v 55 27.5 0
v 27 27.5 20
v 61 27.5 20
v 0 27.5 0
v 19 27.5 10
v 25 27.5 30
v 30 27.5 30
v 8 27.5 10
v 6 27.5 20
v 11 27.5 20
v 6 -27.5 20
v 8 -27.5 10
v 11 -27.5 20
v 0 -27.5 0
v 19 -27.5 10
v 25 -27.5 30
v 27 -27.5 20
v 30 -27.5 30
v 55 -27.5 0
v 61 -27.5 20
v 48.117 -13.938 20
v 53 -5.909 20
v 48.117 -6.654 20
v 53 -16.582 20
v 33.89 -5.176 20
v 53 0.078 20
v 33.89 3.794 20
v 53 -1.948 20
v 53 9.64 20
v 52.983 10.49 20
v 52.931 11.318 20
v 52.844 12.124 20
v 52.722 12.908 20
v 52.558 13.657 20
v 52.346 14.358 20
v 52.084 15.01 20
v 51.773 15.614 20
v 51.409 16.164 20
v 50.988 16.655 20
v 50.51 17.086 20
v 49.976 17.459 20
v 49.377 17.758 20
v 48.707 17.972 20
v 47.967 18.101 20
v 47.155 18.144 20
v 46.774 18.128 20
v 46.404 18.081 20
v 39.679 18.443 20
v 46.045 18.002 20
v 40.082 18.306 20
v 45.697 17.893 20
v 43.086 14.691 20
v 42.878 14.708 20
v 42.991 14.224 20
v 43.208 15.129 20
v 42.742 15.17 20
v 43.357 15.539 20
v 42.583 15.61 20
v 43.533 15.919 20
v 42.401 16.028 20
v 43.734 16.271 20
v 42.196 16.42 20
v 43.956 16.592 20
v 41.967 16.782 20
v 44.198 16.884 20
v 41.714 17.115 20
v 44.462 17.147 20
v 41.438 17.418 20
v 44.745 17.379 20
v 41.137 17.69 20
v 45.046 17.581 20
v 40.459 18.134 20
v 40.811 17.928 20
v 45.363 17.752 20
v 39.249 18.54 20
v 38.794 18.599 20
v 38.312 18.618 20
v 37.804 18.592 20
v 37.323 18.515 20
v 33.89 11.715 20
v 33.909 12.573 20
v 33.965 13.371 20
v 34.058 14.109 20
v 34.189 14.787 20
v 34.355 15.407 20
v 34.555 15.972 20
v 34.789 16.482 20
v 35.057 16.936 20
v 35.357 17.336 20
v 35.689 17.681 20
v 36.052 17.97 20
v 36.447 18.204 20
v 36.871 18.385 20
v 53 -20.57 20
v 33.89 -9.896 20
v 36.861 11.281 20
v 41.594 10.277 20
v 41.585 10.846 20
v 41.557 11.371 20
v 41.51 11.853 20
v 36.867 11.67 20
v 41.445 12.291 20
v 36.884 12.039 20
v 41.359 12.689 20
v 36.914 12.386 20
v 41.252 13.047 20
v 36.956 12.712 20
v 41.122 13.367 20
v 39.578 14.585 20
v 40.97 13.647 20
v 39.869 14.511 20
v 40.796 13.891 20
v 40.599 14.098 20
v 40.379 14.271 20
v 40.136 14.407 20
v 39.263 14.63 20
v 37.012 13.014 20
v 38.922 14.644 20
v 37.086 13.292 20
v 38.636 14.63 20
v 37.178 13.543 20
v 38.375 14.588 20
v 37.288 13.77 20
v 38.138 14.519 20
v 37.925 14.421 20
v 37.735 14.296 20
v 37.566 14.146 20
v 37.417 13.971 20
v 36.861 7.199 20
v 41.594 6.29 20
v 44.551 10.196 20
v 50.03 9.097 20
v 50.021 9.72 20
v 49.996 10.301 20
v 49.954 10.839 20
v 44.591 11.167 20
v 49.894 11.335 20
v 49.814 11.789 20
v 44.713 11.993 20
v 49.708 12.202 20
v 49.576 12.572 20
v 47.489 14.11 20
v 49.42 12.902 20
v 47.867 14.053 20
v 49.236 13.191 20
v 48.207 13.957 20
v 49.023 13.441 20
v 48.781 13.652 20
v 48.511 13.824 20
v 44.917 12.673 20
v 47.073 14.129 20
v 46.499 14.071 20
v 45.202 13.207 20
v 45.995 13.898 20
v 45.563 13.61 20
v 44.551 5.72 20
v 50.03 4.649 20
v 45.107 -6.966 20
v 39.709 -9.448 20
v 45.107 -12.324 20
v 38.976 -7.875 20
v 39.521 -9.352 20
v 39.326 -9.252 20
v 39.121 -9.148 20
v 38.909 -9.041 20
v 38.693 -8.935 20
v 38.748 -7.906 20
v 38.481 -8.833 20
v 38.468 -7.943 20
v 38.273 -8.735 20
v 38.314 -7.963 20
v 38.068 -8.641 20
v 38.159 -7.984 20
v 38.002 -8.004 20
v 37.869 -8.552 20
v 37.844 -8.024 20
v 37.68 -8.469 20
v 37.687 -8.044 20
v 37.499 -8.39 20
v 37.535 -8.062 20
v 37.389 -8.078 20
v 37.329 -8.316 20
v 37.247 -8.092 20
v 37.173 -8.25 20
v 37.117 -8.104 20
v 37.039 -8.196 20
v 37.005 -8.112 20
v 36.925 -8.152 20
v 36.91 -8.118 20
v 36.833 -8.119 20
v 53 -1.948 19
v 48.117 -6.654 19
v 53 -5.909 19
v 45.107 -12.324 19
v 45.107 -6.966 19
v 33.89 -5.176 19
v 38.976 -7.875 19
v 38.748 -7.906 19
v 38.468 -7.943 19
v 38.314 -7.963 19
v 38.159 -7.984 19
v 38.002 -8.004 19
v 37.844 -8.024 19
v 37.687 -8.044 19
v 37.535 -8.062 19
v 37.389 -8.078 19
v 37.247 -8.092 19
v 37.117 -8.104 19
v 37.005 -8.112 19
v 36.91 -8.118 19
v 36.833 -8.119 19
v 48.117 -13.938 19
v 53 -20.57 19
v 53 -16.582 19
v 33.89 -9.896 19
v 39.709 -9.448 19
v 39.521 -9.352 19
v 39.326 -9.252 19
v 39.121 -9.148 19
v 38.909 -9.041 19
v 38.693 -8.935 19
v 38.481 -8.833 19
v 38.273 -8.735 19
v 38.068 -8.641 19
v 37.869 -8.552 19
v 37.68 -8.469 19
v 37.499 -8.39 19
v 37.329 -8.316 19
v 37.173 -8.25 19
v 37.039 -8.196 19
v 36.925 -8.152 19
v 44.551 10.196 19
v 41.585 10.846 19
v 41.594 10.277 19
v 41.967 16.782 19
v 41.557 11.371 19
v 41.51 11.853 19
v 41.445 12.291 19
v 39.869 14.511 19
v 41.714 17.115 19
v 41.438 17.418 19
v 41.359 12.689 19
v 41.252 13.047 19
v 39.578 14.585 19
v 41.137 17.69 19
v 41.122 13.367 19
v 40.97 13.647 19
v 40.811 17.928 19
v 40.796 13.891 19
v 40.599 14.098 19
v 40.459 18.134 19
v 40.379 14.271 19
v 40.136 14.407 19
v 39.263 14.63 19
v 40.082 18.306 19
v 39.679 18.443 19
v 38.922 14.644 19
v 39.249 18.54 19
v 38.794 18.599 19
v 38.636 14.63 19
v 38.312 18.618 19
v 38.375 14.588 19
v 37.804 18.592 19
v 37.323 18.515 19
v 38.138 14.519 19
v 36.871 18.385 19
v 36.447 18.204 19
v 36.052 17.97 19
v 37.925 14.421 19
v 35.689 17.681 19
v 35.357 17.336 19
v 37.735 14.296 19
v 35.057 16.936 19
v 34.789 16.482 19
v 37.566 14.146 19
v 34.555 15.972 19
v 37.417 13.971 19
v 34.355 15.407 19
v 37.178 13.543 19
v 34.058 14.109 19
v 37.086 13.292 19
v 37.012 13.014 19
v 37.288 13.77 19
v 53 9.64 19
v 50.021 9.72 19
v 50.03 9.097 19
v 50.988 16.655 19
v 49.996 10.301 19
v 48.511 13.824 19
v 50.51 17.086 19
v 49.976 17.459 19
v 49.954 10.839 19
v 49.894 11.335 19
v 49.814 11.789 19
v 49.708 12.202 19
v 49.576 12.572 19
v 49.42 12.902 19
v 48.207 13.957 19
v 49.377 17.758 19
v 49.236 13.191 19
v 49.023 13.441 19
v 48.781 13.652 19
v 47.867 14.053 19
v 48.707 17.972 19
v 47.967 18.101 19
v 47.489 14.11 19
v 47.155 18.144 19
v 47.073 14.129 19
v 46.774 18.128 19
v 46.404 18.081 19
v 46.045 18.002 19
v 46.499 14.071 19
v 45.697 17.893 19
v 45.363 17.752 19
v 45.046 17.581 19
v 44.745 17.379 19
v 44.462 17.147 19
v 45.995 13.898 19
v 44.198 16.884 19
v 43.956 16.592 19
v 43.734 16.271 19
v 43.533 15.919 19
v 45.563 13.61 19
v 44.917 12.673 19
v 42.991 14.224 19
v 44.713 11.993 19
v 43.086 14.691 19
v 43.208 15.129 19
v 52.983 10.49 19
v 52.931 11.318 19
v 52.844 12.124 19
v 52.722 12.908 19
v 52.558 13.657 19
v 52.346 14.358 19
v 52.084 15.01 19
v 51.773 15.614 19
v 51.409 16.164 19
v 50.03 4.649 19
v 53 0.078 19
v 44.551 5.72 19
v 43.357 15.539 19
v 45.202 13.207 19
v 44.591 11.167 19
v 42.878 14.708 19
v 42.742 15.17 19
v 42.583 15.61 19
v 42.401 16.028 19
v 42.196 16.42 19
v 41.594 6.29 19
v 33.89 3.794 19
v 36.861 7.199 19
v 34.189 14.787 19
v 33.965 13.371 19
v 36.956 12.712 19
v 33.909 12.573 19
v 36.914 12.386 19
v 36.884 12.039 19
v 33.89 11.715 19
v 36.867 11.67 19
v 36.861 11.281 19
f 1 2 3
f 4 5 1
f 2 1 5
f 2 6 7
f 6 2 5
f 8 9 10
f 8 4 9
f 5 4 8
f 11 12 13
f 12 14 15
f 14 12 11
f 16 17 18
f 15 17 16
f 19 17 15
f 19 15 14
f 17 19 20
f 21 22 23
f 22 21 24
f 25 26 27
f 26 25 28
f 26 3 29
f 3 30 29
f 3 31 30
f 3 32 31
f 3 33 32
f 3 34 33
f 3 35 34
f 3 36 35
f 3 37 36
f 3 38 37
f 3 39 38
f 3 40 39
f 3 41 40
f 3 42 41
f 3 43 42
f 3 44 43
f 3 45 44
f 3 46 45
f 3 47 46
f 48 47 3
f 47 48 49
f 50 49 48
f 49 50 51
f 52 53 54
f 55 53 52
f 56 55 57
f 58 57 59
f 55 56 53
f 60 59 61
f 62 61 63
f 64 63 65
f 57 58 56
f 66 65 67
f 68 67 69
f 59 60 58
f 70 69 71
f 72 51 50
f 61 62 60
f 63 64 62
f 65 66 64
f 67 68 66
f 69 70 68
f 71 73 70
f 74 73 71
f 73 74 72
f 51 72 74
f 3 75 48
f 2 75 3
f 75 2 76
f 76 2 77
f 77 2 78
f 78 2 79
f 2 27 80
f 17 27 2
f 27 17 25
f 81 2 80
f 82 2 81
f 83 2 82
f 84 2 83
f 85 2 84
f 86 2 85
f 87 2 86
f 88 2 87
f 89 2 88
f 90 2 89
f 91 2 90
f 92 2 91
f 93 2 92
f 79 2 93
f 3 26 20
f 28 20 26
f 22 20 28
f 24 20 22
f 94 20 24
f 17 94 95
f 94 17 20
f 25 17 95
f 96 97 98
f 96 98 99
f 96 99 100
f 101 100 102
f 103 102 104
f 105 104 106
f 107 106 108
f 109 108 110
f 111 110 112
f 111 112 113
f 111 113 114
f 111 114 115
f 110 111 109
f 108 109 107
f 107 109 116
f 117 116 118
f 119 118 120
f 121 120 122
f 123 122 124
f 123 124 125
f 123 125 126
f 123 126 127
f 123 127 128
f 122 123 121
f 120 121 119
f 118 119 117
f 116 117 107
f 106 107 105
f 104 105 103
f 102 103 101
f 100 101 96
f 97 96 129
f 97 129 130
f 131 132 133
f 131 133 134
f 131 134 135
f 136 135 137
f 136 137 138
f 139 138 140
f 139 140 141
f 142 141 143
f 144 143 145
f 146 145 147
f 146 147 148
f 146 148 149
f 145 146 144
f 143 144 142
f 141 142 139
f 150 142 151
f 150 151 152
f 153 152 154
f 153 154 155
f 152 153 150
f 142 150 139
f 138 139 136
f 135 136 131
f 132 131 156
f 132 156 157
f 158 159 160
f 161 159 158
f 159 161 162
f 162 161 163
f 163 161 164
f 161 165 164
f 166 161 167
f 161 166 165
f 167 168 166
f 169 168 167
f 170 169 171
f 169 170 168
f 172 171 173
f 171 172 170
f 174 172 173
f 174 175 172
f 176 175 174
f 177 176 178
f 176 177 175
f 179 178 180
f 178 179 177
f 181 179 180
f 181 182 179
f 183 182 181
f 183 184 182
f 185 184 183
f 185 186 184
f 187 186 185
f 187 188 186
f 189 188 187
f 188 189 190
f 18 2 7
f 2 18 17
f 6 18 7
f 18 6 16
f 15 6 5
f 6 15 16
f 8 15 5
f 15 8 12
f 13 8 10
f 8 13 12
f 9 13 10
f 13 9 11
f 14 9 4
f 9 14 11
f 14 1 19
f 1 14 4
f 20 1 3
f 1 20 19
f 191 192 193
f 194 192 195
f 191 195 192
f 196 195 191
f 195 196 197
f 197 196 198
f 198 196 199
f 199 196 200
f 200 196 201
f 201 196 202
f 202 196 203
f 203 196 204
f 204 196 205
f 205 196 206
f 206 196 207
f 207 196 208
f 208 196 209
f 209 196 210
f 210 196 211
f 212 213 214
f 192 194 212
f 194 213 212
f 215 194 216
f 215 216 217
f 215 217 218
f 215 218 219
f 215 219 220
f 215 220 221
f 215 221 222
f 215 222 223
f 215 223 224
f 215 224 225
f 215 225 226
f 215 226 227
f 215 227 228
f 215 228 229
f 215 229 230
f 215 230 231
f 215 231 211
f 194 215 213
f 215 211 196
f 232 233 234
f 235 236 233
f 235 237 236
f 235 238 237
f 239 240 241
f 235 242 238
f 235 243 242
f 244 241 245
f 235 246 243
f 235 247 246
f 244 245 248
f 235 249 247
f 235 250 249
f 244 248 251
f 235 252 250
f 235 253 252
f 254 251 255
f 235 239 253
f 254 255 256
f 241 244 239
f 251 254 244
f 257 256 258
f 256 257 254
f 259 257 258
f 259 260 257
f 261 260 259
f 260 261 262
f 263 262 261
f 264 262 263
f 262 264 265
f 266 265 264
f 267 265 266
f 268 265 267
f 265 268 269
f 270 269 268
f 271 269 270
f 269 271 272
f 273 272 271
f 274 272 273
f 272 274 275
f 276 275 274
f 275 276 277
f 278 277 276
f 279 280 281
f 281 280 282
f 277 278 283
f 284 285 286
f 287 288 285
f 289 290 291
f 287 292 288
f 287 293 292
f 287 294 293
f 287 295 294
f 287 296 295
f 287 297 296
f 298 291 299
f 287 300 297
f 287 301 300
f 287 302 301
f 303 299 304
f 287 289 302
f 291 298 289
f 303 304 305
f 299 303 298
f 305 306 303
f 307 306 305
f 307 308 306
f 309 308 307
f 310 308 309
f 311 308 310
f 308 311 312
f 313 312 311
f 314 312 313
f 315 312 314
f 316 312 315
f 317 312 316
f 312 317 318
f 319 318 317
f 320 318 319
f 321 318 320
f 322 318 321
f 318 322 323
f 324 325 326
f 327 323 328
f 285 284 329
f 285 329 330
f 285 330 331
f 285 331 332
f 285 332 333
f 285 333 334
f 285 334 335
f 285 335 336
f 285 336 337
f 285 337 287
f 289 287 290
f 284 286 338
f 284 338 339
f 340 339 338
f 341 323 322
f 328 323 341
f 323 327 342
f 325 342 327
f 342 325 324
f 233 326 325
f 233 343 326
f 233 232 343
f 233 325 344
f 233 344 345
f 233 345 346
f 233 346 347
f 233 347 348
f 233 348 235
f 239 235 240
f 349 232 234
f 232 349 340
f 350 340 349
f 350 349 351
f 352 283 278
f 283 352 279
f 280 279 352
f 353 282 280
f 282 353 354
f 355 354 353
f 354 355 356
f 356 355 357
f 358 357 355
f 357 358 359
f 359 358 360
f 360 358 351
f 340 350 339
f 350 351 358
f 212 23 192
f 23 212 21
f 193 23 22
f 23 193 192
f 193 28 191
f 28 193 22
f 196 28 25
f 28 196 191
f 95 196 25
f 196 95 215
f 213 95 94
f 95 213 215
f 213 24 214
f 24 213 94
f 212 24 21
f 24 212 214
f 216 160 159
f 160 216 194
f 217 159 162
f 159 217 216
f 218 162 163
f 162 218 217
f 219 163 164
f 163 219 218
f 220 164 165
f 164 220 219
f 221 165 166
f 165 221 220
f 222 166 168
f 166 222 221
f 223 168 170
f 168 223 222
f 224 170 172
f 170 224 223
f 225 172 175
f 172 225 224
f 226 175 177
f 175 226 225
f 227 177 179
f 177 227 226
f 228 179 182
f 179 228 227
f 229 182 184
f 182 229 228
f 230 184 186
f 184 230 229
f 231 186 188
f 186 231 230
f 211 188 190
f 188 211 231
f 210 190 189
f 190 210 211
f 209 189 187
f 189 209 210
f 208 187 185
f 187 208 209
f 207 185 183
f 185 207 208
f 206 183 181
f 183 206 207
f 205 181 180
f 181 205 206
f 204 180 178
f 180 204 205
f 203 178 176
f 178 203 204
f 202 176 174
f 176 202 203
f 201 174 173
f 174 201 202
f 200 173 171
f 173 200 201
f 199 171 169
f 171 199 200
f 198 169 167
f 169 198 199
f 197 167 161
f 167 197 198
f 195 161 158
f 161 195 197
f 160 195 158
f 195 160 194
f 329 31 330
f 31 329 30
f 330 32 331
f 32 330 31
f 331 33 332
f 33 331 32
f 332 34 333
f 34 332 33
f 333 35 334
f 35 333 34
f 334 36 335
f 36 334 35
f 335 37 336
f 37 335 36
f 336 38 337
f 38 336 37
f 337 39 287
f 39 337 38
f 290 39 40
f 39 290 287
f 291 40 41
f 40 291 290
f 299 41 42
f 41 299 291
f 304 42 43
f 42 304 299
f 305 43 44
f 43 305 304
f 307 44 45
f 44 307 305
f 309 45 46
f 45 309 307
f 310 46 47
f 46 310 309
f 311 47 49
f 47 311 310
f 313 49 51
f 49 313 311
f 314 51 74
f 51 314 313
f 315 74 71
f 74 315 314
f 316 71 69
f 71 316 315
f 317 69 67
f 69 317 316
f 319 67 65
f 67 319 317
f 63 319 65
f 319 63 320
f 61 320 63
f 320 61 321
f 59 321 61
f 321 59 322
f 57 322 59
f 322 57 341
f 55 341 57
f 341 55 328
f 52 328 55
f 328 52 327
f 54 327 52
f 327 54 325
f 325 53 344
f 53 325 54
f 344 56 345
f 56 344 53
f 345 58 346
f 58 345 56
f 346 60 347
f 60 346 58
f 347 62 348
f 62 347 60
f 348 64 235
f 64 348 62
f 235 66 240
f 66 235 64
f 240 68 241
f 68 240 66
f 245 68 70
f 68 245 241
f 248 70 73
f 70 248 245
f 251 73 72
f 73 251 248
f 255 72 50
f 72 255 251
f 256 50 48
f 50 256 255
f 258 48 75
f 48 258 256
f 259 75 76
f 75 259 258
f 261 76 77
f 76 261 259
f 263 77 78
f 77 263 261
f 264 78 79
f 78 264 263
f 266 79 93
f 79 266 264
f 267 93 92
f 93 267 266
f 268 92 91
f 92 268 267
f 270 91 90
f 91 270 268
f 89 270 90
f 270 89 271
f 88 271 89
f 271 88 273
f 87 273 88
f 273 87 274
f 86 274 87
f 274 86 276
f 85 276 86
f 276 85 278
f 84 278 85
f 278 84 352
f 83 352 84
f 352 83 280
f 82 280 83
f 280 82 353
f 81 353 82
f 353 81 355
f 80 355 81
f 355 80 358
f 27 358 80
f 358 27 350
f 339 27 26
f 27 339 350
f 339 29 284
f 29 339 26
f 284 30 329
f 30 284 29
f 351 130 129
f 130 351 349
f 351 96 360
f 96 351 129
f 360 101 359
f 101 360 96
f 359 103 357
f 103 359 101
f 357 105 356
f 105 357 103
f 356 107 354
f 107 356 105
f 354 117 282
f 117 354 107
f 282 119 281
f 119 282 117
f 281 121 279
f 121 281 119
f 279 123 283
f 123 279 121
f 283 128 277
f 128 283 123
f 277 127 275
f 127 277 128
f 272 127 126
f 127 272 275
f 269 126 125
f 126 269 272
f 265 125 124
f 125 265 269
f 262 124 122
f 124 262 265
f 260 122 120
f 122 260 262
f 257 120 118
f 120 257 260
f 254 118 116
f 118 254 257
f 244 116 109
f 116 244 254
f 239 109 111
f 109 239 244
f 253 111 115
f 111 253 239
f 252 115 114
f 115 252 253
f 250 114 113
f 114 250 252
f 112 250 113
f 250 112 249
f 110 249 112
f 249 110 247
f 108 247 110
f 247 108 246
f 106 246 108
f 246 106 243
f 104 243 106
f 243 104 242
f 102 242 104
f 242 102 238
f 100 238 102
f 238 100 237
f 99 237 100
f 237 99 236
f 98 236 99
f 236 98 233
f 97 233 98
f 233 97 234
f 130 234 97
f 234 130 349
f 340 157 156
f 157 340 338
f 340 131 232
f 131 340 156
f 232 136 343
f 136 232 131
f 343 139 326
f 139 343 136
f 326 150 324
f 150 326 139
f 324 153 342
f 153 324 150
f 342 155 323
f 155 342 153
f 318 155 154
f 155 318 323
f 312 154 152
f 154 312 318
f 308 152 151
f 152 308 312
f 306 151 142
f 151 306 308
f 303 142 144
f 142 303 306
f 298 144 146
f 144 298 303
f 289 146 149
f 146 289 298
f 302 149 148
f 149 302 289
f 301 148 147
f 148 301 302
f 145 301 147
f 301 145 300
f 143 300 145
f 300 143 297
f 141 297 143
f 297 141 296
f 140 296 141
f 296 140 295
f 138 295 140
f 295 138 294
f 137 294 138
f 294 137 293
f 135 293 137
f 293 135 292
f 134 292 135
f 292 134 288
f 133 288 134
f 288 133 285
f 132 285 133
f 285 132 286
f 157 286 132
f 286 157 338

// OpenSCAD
  rotate([90,0,0])
  difference() {
    // Extrudes the body of the model from the polygon shape
    linear_extrude(height = 55, center = true, convexity = 10,  slices = 20, scale = 1.0) {polygon(points=[[0,0],[55,0],[61,20],[27,20],[30,30], [25,30],[19,10], [8,10], [11,20], [6,20]]);}
    // Imprints text 'AB' on the top surface of the model
    rotate([0,90,90]) translate([-20,-53,19])
    linear_extrude(height = 3,   convexity = 10,  slices = 20, scale = 1.0) {text("AB", font = "Liberation Sans:style=Bold Italic", size = 20);}  
}
